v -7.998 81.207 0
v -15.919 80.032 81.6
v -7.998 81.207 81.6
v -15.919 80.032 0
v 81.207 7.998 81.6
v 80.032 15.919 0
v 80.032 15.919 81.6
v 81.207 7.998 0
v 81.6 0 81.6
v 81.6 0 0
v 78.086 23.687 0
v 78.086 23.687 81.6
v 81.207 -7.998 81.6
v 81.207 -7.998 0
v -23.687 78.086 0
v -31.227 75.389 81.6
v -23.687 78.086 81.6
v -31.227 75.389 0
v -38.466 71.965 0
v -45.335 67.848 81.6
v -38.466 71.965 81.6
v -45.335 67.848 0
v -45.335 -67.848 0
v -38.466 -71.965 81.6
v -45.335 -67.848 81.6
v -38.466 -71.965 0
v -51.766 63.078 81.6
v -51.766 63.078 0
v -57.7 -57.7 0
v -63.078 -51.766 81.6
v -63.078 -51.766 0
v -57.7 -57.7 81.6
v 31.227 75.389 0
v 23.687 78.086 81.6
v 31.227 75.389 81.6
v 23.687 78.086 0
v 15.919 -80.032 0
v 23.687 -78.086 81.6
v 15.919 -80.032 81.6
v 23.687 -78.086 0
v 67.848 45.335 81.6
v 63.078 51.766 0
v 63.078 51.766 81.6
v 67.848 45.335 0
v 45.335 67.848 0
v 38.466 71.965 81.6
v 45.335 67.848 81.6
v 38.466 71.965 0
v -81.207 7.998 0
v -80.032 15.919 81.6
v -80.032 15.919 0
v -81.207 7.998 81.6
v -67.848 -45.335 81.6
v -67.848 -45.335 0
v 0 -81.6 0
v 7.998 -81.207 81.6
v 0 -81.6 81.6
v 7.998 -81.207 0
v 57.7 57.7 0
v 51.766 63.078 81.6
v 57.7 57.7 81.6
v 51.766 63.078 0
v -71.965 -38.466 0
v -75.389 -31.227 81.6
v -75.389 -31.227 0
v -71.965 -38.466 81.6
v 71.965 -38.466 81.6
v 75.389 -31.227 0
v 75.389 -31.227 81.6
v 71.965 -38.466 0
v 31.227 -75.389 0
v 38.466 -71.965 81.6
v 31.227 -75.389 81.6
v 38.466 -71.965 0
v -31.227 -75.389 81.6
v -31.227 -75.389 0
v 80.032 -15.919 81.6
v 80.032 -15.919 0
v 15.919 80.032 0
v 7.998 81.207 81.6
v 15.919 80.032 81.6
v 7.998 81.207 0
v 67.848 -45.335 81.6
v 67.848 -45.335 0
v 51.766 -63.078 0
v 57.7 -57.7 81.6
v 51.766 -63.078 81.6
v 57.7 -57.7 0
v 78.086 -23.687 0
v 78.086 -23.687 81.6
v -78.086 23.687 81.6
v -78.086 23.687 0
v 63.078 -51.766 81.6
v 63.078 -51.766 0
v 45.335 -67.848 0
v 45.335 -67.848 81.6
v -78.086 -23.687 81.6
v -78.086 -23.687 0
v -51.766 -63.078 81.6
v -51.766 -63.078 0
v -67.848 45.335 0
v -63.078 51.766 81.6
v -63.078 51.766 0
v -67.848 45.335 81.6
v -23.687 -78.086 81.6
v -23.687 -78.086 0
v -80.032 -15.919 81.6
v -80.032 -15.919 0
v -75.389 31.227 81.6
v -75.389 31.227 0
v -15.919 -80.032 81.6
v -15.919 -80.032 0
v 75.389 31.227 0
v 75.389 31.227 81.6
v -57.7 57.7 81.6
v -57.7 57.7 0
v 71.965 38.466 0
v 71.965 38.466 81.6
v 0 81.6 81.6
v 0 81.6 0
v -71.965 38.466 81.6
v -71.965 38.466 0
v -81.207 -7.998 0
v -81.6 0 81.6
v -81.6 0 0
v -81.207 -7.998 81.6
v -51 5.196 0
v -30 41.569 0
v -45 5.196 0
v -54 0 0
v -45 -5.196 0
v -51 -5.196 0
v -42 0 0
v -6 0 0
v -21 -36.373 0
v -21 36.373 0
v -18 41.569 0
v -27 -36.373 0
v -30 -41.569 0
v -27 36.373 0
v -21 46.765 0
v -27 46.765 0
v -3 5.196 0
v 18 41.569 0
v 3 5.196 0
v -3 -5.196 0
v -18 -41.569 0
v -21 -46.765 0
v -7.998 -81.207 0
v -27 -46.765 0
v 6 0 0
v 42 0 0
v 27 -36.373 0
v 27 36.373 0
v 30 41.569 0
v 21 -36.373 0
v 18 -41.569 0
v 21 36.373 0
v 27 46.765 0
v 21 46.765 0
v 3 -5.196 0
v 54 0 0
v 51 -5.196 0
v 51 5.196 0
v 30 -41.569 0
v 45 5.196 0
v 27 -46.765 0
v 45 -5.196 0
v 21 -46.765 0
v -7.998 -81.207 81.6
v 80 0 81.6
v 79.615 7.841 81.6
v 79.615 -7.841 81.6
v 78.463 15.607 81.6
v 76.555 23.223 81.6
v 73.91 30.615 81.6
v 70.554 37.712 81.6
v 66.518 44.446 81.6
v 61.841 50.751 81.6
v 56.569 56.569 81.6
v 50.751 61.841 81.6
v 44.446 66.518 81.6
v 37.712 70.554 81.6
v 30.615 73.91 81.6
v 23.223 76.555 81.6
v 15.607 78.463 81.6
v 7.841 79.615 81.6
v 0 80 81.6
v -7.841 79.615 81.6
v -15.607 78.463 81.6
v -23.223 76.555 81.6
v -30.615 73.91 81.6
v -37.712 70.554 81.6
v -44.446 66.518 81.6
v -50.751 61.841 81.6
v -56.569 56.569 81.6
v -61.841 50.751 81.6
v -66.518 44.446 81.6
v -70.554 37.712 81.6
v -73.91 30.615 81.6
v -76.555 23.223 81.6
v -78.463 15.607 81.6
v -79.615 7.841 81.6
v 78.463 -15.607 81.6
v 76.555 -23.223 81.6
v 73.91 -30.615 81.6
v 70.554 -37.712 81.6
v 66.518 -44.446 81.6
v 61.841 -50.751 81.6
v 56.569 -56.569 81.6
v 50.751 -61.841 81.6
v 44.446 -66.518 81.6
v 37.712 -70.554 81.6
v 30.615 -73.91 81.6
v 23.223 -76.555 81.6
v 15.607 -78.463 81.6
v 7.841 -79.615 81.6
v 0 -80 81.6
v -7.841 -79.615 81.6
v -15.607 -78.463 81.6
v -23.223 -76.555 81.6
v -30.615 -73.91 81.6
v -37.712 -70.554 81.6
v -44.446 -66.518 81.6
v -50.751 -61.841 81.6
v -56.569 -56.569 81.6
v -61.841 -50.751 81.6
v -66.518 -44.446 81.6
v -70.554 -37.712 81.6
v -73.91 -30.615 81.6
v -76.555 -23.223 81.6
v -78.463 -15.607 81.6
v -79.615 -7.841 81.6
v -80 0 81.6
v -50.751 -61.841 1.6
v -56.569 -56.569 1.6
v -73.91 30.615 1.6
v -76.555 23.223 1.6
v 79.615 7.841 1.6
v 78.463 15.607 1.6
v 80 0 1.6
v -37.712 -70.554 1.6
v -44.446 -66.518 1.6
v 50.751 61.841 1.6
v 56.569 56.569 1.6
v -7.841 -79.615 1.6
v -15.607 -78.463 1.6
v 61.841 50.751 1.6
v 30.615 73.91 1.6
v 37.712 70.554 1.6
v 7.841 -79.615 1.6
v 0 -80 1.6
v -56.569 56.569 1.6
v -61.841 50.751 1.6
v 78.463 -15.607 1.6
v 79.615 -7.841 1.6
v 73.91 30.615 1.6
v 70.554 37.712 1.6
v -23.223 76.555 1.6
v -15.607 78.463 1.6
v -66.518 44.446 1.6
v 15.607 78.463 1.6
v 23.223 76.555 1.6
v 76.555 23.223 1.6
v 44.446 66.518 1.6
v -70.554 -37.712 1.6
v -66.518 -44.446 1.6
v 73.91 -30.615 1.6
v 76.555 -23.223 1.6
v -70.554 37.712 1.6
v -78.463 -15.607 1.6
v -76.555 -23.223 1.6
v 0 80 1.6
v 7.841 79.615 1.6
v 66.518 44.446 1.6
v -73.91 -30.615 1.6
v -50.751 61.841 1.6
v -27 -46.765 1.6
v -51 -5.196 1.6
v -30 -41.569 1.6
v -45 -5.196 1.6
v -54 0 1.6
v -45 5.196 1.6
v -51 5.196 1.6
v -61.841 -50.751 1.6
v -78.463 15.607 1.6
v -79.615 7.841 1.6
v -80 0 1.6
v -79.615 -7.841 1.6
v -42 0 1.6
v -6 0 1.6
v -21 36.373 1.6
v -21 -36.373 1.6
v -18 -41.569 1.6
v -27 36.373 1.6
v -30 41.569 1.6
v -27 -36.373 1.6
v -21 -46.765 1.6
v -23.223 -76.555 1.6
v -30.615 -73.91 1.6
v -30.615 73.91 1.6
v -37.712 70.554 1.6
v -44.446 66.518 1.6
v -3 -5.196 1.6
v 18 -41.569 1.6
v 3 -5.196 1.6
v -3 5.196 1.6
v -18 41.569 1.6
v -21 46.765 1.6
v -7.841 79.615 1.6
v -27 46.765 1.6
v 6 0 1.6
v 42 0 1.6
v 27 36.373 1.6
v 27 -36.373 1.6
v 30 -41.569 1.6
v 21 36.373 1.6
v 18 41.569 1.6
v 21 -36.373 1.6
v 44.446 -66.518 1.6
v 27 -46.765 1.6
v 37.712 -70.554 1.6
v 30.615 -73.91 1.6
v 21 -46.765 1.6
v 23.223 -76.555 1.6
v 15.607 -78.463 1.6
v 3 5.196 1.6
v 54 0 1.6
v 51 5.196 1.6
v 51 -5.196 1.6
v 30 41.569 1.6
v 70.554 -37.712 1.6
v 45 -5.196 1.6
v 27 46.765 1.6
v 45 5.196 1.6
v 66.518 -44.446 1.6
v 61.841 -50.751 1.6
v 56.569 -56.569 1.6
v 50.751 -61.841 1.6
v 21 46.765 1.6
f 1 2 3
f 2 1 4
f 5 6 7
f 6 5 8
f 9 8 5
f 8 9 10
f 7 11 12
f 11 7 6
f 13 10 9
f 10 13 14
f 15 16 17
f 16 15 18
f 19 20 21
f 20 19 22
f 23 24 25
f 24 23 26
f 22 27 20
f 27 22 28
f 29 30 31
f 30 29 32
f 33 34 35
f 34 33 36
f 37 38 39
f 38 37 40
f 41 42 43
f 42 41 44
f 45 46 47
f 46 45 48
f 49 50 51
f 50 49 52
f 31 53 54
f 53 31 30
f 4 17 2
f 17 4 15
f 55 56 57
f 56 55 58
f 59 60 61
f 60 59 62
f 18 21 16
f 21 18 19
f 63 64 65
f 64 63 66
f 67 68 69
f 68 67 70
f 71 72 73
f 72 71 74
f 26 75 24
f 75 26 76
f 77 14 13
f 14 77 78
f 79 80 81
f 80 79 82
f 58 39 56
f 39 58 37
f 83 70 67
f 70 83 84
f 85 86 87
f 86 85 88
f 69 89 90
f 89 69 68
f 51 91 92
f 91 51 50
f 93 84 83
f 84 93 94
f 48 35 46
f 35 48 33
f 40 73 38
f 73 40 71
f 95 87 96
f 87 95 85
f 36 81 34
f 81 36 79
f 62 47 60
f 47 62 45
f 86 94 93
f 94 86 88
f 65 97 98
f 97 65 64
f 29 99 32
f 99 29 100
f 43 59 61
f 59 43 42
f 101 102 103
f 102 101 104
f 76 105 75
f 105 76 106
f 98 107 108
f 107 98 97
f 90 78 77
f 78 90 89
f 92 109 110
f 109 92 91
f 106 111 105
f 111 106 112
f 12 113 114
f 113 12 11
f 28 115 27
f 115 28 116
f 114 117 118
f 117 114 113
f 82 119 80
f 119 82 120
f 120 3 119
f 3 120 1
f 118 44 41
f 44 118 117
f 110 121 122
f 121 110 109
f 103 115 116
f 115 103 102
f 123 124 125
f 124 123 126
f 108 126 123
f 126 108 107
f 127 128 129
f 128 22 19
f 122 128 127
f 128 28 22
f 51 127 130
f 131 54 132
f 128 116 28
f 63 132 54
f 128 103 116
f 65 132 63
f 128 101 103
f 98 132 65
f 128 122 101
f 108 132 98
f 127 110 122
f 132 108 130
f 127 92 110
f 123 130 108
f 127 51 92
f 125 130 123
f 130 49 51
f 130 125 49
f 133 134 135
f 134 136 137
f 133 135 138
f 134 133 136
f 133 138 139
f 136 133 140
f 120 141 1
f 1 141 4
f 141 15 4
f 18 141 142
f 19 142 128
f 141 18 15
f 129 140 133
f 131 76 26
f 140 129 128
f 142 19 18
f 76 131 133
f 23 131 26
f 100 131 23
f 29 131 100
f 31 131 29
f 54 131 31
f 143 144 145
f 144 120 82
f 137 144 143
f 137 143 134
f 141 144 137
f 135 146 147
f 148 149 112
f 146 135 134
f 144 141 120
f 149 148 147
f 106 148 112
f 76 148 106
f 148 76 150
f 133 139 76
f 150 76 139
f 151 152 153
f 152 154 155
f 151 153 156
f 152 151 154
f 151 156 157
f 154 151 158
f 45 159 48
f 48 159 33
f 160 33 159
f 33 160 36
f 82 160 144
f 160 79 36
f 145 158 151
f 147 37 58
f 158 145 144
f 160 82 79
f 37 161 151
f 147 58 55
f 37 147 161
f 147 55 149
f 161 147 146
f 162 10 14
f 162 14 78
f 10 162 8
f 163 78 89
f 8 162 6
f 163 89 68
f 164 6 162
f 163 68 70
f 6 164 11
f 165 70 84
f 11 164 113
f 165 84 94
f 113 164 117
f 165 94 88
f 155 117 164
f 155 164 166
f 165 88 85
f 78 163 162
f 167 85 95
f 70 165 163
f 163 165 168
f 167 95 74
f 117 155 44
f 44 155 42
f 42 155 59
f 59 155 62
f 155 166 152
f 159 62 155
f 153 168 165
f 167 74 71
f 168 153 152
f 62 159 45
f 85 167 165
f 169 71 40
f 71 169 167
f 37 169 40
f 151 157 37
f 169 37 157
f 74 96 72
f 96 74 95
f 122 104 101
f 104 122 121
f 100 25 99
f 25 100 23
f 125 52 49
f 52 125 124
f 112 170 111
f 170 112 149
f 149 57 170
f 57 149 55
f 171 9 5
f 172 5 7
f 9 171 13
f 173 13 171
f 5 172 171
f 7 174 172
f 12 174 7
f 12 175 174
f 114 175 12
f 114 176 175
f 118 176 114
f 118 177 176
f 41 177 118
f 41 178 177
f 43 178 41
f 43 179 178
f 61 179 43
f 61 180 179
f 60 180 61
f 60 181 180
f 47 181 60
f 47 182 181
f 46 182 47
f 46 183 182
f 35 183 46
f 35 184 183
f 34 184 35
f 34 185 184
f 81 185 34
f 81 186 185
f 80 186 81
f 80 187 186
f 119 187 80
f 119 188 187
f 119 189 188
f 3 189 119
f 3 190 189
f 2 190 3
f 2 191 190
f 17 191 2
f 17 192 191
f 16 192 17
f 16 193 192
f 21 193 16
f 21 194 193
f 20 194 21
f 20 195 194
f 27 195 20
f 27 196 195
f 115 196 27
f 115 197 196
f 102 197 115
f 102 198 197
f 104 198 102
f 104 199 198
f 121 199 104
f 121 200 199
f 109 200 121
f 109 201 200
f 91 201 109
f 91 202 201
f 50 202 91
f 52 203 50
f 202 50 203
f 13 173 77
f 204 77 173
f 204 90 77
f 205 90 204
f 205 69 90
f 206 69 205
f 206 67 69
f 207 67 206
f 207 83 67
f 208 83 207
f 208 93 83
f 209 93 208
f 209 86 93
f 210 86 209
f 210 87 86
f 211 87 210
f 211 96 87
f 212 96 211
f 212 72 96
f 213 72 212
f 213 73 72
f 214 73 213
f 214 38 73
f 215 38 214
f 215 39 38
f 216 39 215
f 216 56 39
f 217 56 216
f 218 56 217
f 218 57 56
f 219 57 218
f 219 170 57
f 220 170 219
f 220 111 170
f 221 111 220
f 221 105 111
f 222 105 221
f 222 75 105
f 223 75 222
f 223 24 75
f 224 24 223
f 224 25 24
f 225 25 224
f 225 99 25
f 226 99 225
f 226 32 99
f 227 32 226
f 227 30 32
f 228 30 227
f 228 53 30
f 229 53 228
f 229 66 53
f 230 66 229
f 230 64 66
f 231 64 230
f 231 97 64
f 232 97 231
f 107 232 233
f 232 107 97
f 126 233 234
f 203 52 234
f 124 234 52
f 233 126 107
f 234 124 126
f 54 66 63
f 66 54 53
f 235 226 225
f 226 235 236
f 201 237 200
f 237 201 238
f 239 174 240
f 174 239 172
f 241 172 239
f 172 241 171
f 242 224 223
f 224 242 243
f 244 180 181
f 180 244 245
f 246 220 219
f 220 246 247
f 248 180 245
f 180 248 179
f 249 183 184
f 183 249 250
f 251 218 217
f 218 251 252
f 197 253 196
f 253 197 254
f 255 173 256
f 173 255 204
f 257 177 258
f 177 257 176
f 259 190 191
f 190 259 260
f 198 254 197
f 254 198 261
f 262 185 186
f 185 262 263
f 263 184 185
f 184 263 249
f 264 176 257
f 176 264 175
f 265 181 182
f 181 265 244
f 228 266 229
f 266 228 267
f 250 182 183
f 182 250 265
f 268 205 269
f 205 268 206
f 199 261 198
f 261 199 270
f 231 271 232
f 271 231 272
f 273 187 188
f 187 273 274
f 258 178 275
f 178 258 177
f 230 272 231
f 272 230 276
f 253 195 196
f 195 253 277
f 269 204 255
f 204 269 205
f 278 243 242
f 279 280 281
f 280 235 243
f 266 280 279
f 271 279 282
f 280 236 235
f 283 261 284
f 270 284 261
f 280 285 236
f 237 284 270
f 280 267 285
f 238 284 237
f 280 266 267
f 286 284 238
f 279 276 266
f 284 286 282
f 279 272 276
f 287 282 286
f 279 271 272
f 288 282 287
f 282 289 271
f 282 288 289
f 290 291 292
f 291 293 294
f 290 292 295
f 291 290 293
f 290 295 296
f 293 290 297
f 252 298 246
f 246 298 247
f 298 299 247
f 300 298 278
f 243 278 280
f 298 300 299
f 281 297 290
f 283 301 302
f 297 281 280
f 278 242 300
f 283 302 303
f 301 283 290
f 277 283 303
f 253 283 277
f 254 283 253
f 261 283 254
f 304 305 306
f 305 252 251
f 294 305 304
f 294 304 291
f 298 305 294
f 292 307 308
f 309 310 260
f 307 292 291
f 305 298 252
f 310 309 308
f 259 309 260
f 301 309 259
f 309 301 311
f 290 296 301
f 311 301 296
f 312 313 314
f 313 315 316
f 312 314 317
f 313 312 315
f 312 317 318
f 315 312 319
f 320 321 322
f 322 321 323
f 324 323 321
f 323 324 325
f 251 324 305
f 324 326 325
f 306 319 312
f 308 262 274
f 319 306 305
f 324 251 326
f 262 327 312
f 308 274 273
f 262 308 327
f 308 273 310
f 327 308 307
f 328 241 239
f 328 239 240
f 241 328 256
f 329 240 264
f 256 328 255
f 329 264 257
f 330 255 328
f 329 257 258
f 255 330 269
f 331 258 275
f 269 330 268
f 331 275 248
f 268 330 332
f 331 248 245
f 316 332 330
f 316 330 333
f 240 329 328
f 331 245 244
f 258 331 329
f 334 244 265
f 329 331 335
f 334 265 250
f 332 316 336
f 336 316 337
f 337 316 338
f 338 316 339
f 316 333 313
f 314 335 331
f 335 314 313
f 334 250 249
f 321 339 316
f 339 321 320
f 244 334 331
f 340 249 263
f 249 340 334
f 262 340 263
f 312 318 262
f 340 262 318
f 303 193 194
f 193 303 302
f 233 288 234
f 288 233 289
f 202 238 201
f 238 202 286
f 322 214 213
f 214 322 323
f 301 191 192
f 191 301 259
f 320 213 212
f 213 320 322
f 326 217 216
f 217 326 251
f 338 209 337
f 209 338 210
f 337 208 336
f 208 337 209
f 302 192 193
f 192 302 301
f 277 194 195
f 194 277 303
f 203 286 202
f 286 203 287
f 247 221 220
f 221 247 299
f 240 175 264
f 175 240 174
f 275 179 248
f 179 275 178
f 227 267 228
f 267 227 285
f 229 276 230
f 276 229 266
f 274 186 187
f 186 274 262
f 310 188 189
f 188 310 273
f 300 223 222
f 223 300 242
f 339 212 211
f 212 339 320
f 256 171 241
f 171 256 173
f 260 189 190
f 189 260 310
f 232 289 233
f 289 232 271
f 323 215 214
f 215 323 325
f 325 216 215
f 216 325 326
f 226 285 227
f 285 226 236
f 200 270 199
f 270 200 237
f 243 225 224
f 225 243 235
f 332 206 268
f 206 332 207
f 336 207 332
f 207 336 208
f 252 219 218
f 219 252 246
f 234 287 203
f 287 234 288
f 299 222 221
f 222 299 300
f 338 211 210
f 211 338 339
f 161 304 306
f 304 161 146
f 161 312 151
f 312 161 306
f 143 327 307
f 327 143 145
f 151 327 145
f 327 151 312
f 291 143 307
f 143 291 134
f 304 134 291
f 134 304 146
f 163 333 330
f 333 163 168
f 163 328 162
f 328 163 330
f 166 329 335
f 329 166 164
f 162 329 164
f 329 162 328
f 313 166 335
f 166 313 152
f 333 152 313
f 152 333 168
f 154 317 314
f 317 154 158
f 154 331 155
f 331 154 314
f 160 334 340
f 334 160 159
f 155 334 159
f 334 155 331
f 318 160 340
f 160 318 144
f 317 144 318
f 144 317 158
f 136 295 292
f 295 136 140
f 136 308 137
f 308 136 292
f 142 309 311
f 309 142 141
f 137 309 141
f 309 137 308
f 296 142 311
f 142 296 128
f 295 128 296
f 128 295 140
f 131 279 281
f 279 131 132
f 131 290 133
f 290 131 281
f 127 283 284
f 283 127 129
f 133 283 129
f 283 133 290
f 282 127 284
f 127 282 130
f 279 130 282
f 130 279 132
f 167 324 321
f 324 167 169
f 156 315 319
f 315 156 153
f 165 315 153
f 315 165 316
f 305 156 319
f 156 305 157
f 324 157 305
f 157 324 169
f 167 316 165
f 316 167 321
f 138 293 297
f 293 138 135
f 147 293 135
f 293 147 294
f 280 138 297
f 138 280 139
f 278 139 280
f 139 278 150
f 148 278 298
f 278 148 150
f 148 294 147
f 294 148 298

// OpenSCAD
$fn=64;
//160

pipeR=80;
h=80;
t=1.6;

xMult=1/2;
yMult=sqrt(3)/2;
holeR=pipeR*0.60;

difference() {
  cylinder(r=pipeR+t,h=h+t);
  translate([0,0,t]) cylinder(r=pipeR,h=h+0.1);
  hole();
  translate([holeR,0,0]) hole();
  translate([holeR*xMult,holeR*yMult,0]) hole();
  translate([holeR*-xMult,holeR*yMult,0]) hole();
  translate([-holeR,0,0]) hole();
  translate([holeR*xMult,holeR*-yMult,0]) hole();
  translate([holeR*-xMult,holeR*-yMult,0]) hole();
}


module hole() {
  translate([0,0,-1]) cylinder(r=6,h=10,$fn=6);
}
